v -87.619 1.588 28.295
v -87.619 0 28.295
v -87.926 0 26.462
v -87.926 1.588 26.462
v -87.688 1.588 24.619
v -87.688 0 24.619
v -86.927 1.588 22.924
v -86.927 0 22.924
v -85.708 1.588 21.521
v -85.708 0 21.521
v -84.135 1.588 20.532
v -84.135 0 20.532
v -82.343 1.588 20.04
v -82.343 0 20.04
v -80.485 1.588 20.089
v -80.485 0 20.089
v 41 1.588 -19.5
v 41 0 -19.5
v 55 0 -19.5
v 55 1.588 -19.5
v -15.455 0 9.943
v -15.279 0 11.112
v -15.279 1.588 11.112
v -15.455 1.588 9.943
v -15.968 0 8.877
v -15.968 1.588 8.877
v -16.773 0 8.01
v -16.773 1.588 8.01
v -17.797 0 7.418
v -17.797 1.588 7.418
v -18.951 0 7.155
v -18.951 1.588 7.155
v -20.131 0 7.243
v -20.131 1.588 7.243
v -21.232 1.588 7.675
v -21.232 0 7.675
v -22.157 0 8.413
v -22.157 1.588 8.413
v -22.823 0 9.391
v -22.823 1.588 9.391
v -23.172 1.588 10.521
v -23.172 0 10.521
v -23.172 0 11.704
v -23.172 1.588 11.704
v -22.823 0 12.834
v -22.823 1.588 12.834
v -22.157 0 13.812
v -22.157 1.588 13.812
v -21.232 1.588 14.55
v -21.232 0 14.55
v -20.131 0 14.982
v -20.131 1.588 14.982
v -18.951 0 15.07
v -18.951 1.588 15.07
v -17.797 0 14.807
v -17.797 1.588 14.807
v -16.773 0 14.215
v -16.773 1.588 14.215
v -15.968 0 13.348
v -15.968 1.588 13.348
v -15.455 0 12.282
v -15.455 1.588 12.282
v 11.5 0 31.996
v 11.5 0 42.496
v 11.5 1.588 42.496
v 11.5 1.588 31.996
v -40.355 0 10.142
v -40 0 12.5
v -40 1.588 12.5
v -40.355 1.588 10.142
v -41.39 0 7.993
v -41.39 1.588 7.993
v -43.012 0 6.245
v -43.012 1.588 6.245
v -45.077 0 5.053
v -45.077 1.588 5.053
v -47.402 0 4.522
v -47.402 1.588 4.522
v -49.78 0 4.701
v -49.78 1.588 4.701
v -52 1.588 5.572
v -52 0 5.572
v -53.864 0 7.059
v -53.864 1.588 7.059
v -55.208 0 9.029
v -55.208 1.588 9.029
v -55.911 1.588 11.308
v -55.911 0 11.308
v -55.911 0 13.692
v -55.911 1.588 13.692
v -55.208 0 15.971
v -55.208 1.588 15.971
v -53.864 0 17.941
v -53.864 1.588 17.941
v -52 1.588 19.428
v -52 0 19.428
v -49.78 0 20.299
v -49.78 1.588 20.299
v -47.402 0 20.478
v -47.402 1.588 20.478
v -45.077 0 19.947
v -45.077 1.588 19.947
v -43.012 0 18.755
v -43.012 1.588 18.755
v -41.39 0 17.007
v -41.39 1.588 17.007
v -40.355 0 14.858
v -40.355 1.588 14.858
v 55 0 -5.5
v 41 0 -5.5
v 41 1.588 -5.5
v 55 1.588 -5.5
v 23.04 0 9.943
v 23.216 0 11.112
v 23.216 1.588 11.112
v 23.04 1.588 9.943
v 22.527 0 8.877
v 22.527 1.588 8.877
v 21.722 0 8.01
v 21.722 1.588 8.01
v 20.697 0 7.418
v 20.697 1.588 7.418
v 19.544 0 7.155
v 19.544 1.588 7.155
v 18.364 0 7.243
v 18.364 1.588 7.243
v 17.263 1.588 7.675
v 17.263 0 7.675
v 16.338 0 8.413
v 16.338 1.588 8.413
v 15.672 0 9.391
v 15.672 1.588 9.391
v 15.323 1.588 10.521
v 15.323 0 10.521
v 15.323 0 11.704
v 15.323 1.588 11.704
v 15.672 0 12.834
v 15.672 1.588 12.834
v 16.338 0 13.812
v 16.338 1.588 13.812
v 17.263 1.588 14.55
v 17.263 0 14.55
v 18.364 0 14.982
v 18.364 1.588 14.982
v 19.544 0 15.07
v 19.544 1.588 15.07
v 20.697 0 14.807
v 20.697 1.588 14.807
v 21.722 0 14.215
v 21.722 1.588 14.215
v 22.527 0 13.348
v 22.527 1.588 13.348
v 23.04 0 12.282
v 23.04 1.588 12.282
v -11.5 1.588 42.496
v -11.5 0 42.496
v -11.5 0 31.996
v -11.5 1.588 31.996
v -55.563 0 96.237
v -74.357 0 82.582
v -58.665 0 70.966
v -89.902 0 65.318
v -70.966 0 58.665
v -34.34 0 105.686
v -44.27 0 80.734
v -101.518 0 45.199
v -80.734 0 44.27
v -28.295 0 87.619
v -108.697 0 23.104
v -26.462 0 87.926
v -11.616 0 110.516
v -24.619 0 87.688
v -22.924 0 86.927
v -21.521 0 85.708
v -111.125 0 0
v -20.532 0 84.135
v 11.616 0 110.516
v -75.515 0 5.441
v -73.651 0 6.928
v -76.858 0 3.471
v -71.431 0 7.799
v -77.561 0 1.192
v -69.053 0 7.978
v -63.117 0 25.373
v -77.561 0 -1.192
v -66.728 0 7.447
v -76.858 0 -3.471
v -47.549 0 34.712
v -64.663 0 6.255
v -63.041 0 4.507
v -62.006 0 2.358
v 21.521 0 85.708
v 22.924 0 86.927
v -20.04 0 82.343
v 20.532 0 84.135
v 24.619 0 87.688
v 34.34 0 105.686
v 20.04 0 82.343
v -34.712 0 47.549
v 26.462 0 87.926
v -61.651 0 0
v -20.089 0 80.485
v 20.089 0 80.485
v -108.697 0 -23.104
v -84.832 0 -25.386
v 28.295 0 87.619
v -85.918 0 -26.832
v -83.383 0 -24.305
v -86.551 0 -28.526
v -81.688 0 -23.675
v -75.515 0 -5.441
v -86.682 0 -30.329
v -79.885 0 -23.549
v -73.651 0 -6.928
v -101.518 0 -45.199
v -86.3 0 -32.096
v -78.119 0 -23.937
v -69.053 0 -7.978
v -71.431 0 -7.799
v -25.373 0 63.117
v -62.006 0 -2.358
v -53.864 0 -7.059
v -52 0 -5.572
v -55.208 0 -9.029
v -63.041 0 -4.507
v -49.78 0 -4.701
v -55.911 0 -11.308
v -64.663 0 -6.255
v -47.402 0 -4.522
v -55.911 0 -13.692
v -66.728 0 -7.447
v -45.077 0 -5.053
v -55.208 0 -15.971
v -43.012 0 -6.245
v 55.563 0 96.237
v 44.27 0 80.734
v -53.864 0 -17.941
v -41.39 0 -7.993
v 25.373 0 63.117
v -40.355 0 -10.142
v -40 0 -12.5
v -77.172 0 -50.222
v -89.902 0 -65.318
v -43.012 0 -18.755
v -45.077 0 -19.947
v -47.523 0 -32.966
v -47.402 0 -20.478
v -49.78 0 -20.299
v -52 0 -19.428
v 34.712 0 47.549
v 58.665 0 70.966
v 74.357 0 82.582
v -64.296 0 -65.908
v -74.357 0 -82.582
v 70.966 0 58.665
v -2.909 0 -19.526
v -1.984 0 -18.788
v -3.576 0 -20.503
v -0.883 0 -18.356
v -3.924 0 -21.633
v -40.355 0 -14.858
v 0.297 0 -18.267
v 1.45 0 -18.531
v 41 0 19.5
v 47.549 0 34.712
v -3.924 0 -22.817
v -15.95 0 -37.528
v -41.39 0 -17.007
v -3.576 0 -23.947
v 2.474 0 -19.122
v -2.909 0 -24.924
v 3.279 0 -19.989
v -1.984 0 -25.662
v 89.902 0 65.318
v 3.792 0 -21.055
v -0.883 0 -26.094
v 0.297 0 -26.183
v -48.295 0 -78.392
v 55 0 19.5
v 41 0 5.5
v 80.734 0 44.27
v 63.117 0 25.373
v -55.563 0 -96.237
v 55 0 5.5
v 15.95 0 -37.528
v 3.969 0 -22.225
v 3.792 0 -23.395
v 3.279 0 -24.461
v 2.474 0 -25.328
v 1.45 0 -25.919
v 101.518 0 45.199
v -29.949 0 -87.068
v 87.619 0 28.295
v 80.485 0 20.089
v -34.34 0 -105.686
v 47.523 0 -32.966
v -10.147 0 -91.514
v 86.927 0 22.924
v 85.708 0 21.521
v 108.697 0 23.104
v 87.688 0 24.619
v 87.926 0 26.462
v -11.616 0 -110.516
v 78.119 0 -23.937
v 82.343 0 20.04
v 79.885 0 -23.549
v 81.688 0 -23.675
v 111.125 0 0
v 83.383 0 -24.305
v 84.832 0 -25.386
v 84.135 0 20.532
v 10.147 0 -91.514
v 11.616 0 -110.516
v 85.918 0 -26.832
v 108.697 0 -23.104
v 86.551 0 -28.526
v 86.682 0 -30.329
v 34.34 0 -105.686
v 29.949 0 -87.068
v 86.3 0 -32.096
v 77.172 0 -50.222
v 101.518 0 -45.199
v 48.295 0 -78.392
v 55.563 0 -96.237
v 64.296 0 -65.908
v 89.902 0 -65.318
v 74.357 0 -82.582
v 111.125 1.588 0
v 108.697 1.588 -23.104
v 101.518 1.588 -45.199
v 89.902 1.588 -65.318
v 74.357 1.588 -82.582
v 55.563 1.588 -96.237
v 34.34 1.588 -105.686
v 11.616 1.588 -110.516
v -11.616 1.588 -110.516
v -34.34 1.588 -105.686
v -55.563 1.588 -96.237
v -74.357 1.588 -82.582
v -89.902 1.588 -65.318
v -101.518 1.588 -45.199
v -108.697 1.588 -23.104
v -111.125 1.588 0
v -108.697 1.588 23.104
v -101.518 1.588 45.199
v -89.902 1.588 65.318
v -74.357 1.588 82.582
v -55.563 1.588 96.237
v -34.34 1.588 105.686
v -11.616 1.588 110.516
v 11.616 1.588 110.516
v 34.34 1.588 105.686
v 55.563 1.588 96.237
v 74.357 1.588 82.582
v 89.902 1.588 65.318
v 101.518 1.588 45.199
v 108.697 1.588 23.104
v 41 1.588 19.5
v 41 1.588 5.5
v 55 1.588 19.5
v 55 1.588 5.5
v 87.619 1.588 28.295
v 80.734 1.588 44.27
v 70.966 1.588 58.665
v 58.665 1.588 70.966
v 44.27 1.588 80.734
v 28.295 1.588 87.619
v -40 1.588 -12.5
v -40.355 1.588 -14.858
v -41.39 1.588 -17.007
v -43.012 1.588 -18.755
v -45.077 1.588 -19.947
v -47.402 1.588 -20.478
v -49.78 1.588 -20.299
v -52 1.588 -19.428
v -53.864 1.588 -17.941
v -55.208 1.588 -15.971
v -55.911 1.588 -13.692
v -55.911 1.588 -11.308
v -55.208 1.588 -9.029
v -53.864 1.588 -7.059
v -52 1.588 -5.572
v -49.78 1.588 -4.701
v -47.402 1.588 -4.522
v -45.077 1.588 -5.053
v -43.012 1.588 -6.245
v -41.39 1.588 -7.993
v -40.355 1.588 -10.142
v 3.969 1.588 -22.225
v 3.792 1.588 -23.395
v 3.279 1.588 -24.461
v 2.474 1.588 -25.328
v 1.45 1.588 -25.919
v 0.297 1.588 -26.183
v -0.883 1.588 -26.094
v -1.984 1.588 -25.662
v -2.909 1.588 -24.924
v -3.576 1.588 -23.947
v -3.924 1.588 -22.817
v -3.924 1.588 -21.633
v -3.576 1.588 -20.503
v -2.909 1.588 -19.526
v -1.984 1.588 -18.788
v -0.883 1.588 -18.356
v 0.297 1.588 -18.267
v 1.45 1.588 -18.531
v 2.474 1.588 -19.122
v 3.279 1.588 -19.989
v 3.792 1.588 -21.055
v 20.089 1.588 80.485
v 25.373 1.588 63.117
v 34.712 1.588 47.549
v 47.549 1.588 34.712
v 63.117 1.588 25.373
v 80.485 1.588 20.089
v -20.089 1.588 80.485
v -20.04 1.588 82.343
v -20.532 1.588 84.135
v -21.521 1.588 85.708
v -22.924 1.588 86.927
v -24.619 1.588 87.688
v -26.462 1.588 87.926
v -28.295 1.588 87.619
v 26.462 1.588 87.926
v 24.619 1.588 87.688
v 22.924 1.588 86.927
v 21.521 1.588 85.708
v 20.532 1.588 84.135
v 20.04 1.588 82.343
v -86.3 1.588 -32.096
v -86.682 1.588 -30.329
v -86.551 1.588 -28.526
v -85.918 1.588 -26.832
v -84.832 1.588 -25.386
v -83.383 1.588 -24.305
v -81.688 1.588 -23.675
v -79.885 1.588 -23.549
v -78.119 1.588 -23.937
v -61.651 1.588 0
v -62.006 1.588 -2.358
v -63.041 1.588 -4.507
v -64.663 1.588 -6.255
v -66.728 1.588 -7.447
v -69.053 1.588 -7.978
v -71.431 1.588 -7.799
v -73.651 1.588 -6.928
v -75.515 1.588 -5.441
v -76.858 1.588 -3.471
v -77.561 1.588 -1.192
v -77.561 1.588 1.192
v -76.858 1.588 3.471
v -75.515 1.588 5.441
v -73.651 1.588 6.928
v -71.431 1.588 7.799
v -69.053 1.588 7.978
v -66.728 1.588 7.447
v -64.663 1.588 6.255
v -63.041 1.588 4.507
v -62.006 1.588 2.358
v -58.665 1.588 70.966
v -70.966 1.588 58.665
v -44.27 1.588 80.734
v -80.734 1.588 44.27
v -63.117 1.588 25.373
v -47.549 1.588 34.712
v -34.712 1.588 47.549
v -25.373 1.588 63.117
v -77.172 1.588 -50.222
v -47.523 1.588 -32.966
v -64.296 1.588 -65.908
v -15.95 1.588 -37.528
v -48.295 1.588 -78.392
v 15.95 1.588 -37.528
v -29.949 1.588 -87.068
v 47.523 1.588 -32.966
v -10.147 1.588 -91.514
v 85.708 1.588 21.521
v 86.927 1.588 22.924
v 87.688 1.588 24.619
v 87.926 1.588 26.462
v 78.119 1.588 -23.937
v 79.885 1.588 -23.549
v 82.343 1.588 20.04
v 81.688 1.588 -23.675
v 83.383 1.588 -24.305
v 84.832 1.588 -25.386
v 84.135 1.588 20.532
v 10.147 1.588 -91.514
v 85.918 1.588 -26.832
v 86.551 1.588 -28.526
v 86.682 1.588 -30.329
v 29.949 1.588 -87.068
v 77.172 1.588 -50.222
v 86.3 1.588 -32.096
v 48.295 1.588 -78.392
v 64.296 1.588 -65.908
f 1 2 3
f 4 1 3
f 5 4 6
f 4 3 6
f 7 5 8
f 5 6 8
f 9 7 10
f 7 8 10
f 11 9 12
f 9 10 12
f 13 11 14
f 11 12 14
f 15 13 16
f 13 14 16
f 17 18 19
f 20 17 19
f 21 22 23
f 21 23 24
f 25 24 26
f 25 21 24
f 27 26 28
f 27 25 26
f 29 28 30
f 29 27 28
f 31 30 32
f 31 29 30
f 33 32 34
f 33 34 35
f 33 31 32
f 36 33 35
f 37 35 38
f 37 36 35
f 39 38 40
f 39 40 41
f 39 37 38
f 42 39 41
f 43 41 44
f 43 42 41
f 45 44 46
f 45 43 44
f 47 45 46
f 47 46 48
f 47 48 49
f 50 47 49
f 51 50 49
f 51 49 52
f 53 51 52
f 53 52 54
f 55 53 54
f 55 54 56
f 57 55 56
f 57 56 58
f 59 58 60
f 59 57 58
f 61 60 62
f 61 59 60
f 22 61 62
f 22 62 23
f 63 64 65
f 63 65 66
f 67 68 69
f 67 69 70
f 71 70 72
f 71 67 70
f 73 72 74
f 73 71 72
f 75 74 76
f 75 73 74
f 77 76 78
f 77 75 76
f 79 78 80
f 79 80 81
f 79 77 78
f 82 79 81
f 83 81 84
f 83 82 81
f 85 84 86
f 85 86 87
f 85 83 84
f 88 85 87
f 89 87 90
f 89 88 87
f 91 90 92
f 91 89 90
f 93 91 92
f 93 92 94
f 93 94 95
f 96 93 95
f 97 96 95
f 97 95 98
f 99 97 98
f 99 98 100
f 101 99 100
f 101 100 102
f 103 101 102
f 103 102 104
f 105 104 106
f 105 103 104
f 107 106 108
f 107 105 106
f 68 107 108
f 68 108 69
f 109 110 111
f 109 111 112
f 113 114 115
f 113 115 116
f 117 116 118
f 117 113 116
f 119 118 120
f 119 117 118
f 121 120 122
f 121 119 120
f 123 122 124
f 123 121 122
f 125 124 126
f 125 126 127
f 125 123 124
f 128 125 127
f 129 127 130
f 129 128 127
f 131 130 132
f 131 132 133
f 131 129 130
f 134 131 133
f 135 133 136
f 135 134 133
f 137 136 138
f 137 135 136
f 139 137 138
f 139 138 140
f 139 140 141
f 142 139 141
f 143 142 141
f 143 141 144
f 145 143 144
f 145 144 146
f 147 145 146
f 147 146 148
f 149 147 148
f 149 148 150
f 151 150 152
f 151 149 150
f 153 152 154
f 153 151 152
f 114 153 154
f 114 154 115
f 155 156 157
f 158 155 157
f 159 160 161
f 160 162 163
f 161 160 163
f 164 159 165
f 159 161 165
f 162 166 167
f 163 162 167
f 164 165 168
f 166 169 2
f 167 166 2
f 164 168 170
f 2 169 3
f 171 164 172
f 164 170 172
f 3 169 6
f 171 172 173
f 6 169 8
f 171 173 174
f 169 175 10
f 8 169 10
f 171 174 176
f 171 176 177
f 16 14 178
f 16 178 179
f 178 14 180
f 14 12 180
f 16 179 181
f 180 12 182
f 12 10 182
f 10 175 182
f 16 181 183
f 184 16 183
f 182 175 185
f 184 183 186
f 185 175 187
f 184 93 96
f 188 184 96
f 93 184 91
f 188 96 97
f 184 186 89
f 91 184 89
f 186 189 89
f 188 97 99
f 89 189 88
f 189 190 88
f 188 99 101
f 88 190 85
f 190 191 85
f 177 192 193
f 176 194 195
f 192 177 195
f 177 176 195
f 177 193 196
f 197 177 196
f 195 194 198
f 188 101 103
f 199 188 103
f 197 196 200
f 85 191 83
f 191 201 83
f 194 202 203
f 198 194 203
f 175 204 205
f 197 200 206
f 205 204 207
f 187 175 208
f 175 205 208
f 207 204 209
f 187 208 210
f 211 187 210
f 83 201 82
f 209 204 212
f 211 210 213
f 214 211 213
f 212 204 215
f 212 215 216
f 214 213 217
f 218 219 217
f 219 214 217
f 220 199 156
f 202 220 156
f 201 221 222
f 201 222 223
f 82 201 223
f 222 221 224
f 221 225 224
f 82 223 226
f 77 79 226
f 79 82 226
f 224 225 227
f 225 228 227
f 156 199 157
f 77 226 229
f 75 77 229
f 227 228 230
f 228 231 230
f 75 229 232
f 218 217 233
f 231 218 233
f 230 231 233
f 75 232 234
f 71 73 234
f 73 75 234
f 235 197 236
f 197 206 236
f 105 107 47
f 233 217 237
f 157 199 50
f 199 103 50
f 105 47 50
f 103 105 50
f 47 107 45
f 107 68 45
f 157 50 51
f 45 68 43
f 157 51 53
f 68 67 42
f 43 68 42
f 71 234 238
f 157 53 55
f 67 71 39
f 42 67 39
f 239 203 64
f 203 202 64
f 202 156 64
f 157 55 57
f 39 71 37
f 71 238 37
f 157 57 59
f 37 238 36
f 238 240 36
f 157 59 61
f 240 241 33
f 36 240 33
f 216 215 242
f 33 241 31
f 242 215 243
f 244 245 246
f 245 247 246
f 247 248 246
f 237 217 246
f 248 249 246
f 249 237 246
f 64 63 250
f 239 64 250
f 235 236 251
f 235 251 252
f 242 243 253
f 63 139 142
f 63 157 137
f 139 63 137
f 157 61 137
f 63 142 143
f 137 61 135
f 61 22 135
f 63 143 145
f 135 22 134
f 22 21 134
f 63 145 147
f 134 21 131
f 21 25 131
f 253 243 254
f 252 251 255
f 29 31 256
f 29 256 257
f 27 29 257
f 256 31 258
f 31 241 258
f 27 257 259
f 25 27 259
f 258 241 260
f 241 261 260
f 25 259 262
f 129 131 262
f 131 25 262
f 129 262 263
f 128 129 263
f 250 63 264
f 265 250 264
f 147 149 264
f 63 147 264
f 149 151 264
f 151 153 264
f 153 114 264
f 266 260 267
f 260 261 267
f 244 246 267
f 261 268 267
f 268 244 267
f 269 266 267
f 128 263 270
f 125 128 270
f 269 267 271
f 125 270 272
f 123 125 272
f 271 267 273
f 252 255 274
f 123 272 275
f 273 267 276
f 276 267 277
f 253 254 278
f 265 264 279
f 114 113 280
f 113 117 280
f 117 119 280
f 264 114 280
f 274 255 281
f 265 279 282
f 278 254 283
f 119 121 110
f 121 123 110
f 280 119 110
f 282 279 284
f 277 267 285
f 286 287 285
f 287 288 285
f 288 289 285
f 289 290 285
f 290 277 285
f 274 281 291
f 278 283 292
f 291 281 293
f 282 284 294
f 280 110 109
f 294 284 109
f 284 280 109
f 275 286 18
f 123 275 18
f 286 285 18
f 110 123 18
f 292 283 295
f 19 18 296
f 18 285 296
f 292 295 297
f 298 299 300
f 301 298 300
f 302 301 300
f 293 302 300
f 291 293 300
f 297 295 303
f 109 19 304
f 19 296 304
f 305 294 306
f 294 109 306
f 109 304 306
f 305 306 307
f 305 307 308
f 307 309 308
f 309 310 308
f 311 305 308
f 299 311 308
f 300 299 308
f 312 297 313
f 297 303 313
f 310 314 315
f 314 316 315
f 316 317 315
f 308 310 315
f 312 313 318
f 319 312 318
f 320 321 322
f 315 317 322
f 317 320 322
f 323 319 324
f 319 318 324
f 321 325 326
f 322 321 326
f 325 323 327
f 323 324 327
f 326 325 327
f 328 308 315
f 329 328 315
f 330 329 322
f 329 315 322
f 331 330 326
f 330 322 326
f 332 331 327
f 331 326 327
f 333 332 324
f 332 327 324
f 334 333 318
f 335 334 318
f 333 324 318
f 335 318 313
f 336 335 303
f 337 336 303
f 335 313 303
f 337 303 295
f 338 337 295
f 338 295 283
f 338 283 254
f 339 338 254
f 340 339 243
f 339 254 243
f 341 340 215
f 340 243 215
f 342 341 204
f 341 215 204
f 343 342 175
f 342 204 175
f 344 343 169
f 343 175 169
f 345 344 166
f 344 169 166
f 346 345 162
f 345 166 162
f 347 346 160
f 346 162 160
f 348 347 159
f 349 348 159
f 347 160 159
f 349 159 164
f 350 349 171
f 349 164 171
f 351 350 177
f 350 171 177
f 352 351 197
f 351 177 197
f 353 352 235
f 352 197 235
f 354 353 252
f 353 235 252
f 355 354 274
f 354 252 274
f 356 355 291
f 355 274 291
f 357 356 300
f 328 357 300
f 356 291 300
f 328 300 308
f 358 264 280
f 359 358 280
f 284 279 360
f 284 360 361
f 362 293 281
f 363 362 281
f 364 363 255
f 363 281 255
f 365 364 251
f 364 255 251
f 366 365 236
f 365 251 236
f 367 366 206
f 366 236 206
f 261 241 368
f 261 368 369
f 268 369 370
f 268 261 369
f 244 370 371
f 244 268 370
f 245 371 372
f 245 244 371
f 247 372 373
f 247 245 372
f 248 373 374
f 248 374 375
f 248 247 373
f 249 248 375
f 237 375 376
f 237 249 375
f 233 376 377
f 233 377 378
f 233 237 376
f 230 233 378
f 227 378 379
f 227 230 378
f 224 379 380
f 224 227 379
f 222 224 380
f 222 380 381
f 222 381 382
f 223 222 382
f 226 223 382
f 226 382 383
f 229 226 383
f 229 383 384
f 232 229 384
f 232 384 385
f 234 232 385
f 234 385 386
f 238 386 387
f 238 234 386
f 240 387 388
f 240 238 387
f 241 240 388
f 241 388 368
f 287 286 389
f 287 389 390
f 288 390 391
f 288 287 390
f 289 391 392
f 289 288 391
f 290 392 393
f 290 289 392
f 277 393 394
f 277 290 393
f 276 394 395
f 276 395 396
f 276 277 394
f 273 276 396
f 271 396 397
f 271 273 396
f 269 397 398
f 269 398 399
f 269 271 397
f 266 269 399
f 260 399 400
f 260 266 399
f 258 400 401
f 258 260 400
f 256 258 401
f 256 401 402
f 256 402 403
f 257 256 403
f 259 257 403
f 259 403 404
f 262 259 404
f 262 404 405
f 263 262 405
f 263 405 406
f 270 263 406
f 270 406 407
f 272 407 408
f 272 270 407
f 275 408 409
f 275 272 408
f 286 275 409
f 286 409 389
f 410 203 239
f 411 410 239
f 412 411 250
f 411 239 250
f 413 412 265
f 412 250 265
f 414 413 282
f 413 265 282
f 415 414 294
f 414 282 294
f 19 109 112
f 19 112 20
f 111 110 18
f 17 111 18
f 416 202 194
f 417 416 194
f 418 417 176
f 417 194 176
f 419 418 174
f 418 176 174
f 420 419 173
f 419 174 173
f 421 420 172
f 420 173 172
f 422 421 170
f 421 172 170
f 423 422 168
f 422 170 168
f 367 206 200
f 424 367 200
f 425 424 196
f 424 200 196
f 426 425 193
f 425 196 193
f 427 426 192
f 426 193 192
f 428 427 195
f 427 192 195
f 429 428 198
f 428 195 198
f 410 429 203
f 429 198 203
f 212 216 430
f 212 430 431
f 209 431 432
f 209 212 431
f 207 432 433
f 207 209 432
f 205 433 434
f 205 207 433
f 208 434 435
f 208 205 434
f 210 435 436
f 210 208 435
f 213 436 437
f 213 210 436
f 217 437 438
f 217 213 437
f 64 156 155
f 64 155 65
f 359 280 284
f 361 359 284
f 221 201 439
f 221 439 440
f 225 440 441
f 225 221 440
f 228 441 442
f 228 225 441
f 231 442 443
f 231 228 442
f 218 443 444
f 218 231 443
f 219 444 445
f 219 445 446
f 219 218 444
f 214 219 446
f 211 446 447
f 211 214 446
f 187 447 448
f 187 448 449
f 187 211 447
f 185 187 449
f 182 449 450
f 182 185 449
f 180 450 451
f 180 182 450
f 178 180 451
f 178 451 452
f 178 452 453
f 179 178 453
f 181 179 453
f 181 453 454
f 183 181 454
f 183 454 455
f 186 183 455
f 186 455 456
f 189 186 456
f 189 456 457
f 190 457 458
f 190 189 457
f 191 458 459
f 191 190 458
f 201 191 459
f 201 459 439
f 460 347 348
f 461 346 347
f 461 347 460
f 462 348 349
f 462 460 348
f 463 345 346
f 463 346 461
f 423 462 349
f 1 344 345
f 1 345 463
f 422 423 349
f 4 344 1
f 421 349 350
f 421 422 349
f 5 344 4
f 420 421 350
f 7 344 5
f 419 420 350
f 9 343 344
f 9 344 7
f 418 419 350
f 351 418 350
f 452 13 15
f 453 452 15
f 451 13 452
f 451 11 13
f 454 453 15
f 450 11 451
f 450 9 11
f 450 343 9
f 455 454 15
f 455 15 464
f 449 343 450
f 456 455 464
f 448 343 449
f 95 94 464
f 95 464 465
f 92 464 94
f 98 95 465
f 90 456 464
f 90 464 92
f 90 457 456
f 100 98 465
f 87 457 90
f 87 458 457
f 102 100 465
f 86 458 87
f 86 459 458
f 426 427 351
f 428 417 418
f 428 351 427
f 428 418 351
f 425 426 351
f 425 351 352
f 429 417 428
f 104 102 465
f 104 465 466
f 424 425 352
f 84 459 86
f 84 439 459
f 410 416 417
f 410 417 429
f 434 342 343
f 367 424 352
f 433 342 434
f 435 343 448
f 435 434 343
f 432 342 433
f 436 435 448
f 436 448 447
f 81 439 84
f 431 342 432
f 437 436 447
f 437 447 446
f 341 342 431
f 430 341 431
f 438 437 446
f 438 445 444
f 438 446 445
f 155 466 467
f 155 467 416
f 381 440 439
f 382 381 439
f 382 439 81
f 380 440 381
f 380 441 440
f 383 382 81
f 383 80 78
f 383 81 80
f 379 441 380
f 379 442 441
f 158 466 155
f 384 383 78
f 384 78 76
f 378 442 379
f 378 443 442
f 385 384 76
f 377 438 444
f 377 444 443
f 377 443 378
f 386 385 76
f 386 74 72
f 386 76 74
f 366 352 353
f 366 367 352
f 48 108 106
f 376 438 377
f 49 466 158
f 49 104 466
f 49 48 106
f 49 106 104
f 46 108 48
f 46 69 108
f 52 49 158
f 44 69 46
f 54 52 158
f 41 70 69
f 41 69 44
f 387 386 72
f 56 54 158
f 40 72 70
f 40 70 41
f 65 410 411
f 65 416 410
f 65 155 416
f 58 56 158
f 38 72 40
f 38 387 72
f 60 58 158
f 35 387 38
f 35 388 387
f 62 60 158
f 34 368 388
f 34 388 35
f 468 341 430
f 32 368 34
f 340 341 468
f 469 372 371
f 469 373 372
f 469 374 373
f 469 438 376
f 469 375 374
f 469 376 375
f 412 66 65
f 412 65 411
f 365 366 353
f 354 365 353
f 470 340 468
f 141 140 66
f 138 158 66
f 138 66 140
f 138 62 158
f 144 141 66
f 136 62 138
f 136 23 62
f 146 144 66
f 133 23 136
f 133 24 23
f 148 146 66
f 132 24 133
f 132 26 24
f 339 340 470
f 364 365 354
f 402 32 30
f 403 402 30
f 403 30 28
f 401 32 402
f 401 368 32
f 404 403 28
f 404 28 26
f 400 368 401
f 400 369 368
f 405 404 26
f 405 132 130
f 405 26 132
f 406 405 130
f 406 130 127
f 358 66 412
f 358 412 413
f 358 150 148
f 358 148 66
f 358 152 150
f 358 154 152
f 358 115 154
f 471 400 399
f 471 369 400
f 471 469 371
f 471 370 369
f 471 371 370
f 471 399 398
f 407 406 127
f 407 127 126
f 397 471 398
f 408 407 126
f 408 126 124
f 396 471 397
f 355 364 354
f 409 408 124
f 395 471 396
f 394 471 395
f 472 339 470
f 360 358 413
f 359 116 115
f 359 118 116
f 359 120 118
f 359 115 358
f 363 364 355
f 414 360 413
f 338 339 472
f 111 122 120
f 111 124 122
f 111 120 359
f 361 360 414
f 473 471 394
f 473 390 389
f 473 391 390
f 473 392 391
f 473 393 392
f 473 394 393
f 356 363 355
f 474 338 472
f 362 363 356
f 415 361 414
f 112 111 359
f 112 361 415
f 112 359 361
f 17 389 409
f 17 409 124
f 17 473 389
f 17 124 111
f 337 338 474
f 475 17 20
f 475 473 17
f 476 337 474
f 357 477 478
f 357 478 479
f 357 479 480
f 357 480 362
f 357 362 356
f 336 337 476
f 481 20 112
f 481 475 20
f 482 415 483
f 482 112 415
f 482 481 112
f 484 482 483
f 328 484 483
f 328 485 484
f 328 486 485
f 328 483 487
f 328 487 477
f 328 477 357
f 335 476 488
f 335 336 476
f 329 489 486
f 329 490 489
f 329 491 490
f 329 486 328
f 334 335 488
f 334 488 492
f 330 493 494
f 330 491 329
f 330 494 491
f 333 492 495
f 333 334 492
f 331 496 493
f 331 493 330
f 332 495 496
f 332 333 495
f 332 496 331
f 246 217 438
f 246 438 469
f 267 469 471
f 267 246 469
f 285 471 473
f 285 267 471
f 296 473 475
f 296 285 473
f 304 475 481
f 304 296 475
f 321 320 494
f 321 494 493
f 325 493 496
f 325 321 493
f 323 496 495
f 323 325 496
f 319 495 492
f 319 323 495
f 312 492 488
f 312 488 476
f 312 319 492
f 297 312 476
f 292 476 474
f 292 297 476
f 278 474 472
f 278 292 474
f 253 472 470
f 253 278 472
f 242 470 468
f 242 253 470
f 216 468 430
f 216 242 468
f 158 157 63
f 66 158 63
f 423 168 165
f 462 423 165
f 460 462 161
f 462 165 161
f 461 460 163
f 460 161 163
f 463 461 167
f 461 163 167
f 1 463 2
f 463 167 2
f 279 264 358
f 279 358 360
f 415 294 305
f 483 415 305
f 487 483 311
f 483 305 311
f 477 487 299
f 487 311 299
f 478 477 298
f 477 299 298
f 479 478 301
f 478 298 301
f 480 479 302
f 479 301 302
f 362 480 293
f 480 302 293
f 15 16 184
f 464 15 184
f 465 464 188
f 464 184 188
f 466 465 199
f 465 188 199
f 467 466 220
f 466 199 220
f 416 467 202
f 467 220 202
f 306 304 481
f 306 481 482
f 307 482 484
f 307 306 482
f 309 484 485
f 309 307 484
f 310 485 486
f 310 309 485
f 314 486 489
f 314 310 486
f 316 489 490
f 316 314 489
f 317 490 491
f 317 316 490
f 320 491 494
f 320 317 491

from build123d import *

# Parameters (mm, degrees)
SKETCH1_R           = 111.125
SKETCH1_R_2         = 3.96875
SKETCH1_R_3         = 8
SKETCH1_W           = 14
SKETCH1_H           = 14
SKETCH1_W_2         = 23
SKETCH1_H_2         = 10.5
BOSS_EXTRUDE1_DEPTH = 1.5875


with BuildPart() as part:
    # Sketch1 → Boss-Extrude1 (new body)
    with BuildSketch(Plane(origin=(0, 0, 0), x_dir=(1, 0, 0), z_dir=(0, 1, 0))):
        Circle(SKETCH1_R)
        with Locations((0, 22.225)):
            Circle(SKETCH1_R_2, mode=Mode.SUBTRACT)
        with Locations((19.247414599, -11.1125)):
            Circle(SKETCH1_R_2, mode=Mode.SUBTRACT)
        with Locations((-19.247414599, -11.1125)):
            Circle(SKETCH1_R_2, mode=Mode.SUBTRACT)
        with Locations((-48, -12.5)):
            Circle(SKETCH1_R_3, mode=Mode.SUBTRACT)
        with Locations((-69.650635095, 0)):
            Circle(SKETCH1_R_3, mode=Mode.SUBTRACT)
        with Locations((-48, 12.5)):
            Circle(SKETCH1_R_3, mode=Mode.SUBTRACT)
        with Locations((48, 12.5)):
            Rectangle(SKETCH1_W, SKETCH1_H, mode=Mode.SUBTRACT)
        with Locations((0, -37.246432928)):
            Rectangle(SKETCH1_W_2, SKETCH1_H_2, mode=Mode.SUBTRACT)
        with Locations((48, -12.5)):
            Rectangle(SKETCH1_W, SKETCH1_H, mode=Mode.SUBTRACT)
        with BuildLine():
            ThreePointArc((86.299834064, 32.095860566), (0, 92.075), (-86.299834064, 32.095860566))
            ThreePointArc((-86.299834064, 32.095860566), (-84.832280885, 25.386264259), (-78.118809332, 23.936541993))
            ThreePointArc((-78.118809332, 23.936541993), (0, 38.1), (78.118809332, 23.936541993))
            ThreePointArc((78.118809332, 23.936541993), (84.832280885, 25.386264259), (86.299834064, 32.095860566))
        make_face(mode=Mode.SUBTRACT)
        with BuildLine():
            ThreePointArc((-80.484779709, -20.088608264), (-40.736920582, -40.736920582), (-20.088608264, -80.484779709))
            ThreePointArc((-20.088608264, -80.484779709), (-22.177824514, -86.368987271), (-28.295419505, -87.619489042))
            ThreePointArc((-28.295419505, -87.619489042), (-65.106856878, -65.106856878), (-87.619489042, -28.295419505))
            ThreePointArc((-87.619489042, -28.295419505), (-86.368987271, -22.177824514), (-80.484779709, -20.088608264))
        make_face(mode=Mode.SUBTRACT)
        with BuildLine():
            ThreePointArc((20.088608264, -80.484779709), (40.736920582, -40.736920582), (80.484779709, -20.088608264))
            ThreePointArc((80.484779709, -20.088608264), (86.368987271, -22.177824514), (87.619489042, -28.295419505))
            ThreePointArc((87.619489042, -28.295419505), (65.106856878, -65.106856878), (28.295419505, -87.619489042))
            ThreePointArc((28.295419505, -87.619489042), (22.177824514, -86.368987271), (20.088608264, -80.484779709))
        make_face(mode=Mode.SUBTRACT)
    extrude(amount=BOSS_EXTRUDE1_DEPTH)


solid = part.part
